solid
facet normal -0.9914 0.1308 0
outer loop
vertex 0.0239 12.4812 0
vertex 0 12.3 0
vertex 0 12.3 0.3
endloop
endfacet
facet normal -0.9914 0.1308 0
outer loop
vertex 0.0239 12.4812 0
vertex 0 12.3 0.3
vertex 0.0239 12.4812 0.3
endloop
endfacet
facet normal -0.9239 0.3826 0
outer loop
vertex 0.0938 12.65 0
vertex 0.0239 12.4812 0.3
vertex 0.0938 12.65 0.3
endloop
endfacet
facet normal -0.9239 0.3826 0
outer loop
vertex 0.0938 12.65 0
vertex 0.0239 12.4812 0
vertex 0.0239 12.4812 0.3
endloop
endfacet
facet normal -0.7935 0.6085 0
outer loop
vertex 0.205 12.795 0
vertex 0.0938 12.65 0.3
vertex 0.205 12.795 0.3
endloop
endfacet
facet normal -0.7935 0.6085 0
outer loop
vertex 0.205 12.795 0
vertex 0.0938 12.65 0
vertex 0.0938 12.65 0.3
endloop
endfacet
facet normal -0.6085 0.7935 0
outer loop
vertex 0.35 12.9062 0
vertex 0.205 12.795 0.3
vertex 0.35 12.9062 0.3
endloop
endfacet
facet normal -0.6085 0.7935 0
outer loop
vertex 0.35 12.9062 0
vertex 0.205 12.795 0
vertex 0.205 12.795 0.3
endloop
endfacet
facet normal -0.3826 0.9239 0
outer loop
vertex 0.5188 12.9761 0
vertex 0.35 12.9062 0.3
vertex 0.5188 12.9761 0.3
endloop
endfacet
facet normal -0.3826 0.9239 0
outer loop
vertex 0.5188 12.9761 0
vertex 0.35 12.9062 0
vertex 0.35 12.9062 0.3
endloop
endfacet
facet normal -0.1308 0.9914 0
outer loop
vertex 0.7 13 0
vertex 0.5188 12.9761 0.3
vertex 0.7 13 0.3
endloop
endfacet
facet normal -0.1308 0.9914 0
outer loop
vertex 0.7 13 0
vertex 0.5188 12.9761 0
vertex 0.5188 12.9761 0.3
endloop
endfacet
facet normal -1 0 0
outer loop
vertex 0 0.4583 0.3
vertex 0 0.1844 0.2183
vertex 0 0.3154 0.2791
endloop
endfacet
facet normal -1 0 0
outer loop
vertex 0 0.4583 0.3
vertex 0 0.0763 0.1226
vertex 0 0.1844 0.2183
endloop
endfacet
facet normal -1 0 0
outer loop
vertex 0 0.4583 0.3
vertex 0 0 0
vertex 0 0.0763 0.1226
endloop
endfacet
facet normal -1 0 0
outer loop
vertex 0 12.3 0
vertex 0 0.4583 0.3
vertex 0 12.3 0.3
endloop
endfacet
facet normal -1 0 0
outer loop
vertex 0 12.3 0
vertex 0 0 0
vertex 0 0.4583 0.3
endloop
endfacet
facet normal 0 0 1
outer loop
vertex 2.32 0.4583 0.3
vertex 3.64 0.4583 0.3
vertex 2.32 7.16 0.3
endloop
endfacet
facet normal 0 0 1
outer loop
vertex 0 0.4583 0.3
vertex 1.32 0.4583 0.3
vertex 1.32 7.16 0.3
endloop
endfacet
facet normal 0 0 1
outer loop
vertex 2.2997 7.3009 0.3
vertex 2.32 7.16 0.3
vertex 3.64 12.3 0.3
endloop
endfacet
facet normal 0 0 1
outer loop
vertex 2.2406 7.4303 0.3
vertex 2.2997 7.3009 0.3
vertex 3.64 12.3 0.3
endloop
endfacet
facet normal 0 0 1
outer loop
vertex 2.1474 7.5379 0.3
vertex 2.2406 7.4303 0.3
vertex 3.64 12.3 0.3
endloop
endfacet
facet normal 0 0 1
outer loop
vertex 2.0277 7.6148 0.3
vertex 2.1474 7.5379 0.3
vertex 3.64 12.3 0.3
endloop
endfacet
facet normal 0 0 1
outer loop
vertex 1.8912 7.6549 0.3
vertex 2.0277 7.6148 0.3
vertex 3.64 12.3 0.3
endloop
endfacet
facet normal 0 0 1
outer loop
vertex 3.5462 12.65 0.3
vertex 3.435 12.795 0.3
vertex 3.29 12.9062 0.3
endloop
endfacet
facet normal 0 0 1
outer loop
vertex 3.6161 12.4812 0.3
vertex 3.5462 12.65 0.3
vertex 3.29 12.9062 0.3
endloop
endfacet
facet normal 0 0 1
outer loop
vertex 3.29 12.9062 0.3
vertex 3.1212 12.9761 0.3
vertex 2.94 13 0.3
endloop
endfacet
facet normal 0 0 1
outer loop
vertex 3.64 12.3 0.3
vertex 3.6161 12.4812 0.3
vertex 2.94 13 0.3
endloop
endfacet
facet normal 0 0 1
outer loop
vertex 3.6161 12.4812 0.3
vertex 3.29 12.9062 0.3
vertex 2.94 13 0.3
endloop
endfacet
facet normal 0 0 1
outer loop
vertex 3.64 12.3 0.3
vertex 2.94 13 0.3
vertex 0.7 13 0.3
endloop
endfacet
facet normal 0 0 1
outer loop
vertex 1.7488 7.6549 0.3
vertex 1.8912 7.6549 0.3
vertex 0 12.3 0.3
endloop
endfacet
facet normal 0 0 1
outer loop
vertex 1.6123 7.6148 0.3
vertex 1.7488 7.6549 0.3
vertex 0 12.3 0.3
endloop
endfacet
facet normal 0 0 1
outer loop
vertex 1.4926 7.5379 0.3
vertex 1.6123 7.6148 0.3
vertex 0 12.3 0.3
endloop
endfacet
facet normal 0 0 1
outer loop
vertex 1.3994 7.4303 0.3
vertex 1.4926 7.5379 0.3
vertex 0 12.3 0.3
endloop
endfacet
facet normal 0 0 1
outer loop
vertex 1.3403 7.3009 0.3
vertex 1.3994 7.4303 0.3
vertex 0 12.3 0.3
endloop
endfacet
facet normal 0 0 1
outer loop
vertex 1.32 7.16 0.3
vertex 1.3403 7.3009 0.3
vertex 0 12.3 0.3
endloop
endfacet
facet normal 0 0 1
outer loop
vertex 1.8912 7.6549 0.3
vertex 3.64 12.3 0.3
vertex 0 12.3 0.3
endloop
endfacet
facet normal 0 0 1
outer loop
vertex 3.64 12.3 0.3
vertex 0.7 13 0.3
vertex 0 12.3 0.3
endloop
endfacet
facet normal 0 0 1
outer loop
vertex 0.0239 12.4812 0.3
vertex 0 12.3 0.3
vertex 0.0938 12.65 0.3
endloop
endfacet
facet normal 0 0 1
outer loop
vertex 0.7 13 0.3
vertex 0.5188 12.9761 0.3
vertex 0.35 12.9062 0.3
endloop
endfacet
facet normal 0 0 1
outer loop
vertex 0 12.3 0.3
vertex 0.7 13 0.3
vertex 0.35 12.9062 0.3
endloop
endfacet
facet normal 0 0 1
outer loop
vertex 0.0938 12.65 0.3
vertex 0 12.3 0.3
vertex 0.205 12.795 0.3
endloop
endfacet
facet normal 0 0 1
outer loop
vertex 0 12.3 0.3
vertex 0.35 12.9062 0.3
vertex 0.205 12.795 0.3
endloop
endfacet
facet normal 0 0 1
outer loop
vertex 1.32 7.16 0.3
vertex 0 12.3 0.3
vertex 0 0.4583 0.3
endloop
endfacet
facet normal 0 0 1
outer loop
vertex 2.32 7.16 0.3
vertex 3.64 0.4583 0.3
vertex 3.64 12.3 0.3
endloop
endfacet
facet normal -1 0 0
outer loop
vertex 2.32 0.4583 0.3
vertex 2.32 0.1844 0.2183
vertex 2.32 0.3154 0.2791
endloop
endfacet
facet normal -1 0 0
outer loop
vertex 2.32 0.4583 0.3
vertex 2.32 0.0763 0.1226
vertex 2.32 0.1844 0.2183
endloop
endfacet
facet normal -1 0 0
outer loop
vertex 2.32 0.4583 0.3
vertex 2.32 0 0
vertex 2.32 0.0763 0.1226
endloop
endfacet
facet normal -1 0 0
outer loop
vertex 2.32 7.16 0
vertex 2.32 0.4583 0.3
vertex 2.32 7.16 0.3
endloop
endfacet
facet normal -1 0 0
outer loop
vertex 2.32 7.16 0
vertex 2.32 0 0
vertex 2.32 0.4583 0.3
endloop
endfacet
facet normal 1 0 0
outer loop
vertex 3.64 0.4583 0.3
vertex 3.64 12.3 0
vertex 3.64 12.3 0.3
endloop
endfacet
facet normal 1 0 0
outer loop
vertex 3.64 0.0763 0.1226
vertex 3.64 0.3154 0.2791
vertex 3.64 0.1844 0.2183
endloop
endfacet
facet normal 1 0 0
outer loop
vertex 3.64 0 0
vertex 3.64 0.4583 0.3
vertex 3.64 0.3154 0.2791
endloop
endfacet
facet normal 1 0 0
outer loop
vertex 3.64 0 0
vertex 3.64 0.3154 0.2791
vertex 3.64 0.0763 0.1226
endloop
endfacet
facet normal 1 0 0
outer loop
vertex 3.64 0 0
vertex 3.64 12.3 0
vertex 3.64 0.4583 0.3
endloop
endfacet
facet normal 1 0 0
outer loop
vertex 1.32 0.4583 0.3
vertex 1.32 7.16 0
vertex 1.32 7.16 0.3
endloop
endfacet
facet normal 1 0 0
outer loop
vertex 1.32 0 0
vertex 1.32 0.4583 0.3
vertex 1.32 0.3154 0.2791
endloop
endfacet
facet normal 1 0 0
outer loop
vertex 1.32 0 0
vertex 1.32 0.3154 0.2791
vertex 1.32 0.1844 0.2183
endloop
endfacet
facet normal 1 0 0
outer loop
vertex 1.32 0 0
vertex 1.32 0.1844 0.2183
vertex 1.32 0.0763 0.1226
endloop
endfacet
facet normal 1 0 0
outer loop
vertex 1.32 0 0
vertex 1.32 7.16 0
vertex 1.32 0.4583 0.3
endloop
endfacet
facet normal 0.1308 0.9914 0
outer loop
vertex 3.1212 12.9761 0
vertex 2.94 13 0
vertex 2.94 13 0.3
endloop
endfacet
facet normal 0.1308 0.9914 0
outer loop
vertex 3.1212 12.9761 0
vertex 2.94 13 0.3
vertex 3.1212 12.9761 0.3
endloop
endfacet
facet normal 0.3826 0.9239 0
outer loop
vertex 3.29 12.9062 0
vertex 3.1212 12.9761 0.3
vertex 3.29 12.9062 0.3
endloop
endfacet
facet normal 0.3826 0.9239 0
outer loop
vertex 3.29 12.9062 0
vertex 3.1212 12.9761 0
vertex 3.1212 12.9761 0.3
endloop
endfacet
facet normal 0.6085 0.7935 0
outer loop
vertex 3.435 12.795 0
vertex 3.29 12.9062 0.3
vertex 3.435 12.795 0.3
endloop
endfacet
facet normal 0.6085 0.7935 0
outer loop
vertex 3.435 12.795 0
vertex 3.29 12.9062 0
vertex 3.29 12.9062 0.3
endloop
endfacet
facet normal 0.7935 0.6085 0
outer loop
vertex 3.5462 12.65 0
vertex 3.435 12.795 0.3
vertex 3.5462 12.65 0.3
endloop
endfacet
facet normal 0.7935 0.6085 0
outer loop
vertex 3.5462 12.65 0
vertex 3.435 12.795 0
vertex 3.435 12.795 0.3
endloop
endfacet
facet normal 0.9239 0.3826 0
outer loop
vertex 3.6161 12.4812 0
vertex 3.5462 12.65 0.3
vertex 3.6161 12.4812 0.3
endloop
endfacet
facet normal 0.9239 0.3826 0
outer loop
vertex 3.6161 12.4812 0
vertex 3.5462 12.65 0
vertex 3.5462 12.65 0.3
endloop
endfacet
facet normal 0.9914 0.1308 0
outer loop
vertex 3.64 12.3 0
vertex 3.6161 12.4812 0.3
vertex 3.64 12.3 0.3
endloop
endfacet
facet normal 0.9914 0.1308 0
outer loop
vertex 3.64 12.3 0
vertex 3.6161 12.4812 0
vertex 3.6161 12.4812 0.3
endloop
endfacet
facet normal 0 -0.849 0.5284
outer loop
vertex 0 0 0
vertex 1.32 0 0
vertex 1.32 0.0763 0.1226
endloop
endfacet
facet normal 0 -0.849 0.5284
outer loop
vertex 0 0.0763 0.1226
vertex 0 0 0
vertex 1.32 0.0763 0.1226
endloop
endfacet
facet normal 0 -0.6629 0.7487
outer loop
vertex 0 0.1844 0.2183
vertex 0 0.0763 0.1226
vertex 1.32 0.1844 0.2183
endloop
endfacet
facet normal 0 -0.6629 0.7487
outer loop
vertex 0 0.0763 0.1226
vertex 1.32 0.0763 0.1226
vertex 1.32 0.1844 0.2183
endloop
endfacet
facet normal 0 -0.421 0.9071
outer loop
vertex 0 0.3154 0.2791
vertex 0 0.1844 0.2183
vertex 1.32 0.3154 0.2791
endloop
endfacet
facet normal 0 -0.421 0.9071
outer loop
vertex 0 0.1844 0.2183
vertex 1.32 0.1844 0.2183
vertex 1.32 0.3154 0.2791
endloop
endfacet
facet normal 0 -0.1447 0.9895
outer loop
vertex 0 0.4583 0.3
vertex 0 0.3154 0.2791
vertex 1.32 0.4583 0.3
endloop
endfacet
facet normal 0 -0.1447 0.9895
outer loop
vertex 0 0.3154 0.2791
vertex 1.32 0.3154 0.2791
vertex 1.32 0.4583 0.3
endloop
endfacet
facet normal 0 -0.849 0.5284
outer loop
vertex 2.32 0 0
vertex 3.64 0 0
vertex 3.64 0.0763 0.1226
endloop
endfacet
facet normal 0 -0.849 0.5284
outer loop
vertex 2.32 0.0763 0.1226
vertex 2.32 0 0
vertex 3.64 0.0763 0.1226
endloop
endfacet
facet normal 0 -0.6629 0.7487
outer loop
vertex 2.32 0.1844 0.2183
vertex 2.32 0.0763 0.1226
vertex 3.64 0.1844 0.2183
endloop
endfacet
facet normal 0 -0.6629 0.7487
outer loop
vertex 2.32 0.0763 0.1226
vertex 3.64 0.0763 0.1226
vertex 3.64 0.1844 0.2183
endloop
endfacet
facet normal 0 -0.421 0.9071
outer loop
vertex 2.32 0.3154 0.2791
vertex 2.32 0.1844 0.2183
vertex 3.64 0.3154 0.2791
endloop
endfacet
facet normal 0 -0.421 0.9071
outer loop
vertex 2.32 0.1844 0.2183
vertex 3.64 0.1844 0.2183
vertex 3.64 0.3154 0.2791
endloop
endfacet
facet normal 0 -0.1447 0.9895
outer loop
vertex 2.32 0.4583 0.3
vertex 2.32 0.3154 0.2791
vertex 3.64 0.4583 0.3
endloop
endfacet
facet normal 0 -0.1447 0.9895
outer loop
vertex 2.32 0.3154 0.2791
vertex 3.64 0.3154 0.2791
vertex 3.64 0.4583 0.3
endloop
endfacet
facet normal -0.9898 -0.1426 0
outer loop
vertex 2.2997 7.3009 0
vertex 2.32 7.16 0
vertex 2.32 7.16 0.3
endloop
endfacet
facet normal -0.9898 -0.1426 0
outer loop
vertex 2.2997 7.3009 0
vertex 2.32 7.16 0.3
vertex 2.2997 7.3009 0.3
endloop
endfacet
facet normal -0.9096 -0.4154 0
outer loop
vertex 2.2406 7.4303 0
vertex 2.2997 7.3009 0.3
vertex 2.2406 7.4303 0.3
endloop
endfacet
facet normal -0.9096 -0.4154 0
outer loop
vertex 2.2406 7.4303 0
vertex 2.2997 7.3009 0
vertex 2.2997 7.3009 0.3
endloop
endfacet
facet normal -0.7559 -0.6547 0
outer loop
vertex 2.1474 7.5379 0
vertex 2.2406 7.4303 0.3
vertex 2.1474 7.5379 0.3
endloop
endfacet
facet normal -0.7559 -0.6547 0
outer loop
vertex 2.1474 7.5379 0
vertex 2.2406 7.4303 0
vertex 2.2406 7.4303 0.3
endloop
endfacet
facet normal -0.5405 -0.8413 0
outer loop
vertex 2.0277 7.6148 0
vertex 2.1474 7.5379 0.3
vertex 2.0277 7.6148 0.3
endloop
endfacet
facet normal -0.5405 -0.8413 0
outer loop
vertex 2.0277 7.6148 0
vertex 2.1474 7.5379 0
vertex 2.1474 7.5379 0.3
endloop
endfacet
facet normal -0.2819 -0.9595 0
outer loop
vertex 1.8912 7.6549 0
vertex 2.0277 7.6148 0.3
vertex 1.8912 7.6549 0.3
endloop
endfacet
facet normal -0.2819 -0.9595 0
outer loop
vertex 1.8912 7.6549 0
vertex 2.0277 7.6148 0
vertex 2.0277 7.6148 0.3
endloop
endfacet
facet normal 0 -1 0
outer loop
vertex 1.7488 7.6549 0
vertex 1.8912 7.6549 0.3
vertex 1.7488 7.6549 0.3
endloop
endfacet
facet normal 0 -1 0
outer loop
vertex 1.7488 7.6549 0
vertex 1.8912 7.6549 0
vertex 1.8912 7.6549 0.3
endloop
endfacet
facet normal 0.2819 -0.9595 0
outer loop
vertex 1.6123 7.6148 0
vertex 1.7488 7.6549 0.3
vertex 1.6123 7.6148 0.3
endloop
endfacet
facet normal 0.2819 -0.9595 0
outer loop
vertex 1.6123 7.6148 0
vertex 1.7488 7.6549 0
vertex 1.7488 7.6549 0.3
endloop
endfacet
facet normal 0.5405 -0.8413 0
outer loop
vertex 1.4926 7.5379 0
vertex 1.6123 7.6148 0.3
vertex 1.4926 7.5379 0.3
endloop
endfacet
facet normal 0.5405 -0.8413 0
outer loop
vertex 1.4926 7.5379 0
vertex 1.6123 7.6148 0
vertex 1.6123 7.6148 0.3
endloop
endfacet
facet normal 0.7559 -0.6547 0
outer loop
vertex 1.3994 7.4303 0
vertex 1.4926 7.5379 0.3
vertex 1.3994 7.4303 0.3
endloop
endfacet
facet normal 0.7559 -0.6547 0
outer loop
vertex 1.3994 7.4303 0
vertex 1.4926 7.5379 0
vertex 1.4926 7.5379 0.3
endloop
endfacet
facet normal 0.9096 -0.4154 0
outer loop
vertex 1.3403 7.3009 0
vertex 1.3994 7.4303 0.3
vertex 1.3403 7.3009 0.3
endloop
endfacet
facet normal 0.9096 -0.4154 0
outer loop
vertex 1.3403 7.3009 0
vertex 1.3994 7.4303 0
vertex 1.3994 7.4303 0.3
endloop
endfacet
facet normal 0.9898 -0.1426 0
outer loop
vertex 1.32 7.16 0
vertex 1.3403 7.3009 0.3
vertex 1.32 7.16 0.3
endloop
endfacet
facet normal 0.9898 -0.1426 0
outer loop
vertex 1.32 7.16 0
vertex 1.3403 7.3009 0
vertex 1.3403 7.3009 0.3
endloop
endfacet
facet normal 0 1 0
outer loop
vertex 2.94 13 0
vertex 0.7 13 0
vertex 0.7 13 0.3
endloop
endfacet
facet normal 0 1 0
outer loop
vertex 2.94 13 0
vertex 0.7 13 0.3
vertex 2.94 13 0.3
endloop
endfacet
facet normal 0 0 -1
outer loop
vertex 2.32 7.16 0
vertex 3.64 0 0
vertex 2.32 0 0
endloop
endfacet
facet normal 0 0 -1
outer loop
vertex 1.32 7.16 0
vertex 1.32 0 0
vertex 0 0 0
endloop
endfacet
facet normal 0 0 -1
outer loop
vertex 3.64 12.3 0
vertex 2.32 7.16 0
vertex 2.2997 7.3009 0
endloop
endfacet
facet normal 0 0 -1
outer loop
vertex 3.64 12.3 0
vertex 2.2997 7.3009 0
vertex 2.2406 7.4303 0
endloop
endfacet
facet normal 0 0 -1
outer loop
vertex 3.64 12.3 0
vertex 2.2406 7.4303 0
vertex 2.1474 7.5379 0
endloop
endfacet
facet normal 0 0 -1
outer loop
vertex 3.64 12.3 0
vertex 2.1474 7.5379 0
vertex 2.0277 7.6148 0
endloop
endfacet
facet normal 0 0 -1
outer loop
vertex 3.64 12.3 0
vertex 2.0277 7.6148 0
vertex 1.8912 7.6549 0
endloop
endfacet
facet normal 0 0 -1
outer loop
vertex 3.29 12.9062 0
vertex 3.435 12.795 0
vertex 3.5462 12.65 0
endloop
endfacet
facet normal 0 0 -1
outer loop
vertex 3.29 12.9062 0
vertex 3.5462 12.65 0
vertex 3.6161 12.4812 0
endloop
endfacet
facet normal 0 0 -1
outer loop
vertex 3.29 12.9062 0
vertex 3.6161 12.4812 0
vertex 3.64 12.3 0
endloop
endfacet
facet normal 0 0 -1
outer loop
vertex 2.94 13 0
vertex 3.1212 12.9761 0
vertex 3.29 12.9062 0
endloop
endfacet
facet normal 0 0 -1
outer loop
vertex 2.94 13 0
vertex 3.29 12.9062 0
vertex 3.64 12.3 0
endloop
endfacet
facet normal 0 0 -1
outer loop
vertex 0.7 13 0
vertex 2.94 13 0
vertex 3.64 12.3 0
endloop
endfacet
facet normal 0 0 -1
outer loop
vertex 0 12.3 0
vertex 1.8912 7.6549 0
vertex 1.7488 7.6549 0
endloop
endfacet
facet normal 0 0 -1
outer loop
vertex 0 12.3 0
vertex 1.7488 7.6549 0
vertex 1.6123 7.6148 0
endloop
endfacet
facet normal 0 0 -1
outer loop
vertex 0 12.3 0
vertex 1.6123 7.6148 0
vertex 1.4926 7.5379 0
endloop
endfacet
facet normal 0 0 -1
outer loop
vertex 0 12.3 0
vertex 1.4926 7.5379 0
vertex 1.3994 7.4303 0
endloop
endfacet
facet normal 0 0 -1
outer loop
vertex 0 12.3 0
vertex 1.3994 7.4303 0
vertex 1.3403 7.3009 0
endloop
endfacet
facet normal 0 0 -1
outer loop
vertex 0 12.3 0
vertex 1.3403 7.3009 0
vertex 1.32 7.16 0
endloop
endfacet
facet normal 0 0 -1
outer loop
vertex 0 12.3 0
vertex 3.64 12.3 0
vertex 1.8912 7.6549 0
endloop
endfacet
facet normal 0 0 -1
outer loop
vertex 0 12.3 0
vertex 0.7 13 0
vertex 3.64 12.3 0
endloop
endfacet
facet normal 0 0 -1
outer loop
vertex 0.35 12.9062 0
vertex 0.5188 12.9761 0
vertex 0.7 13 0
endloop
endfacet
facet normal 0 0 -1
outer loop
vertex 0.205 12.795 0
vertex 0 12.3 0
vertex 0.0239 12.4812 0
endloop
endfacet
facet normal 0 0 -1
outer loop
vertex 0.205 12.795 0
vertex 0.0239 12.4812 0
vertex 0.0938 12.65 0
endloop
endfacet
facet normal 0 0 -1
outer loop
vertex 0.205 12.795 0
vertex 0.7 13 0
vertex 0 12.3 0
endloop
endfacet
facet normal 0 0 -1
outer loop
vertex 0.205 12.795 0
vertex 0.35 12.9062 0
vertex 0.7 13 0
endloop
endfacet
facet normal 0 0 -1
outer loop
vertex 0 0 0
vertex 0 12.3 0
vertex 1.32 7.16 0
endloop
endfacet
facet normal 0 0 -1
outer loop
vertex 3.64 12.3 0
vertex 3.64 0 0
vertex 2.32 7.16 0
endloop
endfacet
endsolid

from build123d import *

# Parameters (mm, degrees)
EXTRUDE_1_DEPTH = 0.3
FILLET_1_R      = 0.5


with BuildPart() as part:
    # 草图1 → 凸台-拉伸1 (new body)
    with BuildSketch(Plane.XY):
        with BuildLine():
            Line((0, 0), (0, 12.3))
            ThreePointArc((0, 12.3), (0.205025253, 12.794974747), (0.7, 13))
            Line((0.7, 13), (2.94, 13))
            ThreePointArc((2.94, 13), (3.434974747, 12.794974747), (3.64, 12.3))
            Line((3.64, 12.3), (3.64, 0))
            Line((3.64, 0), (2.32, 0))
            Line((2.32, 0), (2.32, 7.16))
            ThreePointArc((2.32, 7.16), (1.82, 7.66), (1.32, 7.16))
            Line((1.32, 7.16), (1.32, 0))
            Line((1.32, 0), (0, 0))
        make_face()
    extrude(amount=EXTRUDE_1_DEPTH)

    # 圆角1
    # the kernel refuses this fillet: 0.5 mm, written as the material it takes off along each edge
    with BuildSketch(Plane(origin=(2.465643924, 0, 0.3), x_dir=(0, 0, -1), z_dir=(-1, 0, 0)), Plane(origin=(4.785643924, 0, 0.3), x_dir=(0, 0, -1), z_dir=(-1, 0, 0))) as fillet_1_piece_1:
        with BuildLine():
            CenterArc((0.5, -0.458257569), FILLET_1_R, 113.578178478, 66.421821522)
            Line((0, -0.458257569), (-0.01, -0.458257569))
            Line((-0.01, -0.458257569), (-0.01, 0))
            Line((-0.01, 0), (0, 0.01))
            ThreePointArc((0, 0.01), (0.15, 0.01), (0.296, 0.009165151))
            Line((0.296, 0.009165151), (0.3, 0))
        make_face()
    extrude(amount=3.611287847, mode=Mode.SUBTRACT)


solid = part.part
